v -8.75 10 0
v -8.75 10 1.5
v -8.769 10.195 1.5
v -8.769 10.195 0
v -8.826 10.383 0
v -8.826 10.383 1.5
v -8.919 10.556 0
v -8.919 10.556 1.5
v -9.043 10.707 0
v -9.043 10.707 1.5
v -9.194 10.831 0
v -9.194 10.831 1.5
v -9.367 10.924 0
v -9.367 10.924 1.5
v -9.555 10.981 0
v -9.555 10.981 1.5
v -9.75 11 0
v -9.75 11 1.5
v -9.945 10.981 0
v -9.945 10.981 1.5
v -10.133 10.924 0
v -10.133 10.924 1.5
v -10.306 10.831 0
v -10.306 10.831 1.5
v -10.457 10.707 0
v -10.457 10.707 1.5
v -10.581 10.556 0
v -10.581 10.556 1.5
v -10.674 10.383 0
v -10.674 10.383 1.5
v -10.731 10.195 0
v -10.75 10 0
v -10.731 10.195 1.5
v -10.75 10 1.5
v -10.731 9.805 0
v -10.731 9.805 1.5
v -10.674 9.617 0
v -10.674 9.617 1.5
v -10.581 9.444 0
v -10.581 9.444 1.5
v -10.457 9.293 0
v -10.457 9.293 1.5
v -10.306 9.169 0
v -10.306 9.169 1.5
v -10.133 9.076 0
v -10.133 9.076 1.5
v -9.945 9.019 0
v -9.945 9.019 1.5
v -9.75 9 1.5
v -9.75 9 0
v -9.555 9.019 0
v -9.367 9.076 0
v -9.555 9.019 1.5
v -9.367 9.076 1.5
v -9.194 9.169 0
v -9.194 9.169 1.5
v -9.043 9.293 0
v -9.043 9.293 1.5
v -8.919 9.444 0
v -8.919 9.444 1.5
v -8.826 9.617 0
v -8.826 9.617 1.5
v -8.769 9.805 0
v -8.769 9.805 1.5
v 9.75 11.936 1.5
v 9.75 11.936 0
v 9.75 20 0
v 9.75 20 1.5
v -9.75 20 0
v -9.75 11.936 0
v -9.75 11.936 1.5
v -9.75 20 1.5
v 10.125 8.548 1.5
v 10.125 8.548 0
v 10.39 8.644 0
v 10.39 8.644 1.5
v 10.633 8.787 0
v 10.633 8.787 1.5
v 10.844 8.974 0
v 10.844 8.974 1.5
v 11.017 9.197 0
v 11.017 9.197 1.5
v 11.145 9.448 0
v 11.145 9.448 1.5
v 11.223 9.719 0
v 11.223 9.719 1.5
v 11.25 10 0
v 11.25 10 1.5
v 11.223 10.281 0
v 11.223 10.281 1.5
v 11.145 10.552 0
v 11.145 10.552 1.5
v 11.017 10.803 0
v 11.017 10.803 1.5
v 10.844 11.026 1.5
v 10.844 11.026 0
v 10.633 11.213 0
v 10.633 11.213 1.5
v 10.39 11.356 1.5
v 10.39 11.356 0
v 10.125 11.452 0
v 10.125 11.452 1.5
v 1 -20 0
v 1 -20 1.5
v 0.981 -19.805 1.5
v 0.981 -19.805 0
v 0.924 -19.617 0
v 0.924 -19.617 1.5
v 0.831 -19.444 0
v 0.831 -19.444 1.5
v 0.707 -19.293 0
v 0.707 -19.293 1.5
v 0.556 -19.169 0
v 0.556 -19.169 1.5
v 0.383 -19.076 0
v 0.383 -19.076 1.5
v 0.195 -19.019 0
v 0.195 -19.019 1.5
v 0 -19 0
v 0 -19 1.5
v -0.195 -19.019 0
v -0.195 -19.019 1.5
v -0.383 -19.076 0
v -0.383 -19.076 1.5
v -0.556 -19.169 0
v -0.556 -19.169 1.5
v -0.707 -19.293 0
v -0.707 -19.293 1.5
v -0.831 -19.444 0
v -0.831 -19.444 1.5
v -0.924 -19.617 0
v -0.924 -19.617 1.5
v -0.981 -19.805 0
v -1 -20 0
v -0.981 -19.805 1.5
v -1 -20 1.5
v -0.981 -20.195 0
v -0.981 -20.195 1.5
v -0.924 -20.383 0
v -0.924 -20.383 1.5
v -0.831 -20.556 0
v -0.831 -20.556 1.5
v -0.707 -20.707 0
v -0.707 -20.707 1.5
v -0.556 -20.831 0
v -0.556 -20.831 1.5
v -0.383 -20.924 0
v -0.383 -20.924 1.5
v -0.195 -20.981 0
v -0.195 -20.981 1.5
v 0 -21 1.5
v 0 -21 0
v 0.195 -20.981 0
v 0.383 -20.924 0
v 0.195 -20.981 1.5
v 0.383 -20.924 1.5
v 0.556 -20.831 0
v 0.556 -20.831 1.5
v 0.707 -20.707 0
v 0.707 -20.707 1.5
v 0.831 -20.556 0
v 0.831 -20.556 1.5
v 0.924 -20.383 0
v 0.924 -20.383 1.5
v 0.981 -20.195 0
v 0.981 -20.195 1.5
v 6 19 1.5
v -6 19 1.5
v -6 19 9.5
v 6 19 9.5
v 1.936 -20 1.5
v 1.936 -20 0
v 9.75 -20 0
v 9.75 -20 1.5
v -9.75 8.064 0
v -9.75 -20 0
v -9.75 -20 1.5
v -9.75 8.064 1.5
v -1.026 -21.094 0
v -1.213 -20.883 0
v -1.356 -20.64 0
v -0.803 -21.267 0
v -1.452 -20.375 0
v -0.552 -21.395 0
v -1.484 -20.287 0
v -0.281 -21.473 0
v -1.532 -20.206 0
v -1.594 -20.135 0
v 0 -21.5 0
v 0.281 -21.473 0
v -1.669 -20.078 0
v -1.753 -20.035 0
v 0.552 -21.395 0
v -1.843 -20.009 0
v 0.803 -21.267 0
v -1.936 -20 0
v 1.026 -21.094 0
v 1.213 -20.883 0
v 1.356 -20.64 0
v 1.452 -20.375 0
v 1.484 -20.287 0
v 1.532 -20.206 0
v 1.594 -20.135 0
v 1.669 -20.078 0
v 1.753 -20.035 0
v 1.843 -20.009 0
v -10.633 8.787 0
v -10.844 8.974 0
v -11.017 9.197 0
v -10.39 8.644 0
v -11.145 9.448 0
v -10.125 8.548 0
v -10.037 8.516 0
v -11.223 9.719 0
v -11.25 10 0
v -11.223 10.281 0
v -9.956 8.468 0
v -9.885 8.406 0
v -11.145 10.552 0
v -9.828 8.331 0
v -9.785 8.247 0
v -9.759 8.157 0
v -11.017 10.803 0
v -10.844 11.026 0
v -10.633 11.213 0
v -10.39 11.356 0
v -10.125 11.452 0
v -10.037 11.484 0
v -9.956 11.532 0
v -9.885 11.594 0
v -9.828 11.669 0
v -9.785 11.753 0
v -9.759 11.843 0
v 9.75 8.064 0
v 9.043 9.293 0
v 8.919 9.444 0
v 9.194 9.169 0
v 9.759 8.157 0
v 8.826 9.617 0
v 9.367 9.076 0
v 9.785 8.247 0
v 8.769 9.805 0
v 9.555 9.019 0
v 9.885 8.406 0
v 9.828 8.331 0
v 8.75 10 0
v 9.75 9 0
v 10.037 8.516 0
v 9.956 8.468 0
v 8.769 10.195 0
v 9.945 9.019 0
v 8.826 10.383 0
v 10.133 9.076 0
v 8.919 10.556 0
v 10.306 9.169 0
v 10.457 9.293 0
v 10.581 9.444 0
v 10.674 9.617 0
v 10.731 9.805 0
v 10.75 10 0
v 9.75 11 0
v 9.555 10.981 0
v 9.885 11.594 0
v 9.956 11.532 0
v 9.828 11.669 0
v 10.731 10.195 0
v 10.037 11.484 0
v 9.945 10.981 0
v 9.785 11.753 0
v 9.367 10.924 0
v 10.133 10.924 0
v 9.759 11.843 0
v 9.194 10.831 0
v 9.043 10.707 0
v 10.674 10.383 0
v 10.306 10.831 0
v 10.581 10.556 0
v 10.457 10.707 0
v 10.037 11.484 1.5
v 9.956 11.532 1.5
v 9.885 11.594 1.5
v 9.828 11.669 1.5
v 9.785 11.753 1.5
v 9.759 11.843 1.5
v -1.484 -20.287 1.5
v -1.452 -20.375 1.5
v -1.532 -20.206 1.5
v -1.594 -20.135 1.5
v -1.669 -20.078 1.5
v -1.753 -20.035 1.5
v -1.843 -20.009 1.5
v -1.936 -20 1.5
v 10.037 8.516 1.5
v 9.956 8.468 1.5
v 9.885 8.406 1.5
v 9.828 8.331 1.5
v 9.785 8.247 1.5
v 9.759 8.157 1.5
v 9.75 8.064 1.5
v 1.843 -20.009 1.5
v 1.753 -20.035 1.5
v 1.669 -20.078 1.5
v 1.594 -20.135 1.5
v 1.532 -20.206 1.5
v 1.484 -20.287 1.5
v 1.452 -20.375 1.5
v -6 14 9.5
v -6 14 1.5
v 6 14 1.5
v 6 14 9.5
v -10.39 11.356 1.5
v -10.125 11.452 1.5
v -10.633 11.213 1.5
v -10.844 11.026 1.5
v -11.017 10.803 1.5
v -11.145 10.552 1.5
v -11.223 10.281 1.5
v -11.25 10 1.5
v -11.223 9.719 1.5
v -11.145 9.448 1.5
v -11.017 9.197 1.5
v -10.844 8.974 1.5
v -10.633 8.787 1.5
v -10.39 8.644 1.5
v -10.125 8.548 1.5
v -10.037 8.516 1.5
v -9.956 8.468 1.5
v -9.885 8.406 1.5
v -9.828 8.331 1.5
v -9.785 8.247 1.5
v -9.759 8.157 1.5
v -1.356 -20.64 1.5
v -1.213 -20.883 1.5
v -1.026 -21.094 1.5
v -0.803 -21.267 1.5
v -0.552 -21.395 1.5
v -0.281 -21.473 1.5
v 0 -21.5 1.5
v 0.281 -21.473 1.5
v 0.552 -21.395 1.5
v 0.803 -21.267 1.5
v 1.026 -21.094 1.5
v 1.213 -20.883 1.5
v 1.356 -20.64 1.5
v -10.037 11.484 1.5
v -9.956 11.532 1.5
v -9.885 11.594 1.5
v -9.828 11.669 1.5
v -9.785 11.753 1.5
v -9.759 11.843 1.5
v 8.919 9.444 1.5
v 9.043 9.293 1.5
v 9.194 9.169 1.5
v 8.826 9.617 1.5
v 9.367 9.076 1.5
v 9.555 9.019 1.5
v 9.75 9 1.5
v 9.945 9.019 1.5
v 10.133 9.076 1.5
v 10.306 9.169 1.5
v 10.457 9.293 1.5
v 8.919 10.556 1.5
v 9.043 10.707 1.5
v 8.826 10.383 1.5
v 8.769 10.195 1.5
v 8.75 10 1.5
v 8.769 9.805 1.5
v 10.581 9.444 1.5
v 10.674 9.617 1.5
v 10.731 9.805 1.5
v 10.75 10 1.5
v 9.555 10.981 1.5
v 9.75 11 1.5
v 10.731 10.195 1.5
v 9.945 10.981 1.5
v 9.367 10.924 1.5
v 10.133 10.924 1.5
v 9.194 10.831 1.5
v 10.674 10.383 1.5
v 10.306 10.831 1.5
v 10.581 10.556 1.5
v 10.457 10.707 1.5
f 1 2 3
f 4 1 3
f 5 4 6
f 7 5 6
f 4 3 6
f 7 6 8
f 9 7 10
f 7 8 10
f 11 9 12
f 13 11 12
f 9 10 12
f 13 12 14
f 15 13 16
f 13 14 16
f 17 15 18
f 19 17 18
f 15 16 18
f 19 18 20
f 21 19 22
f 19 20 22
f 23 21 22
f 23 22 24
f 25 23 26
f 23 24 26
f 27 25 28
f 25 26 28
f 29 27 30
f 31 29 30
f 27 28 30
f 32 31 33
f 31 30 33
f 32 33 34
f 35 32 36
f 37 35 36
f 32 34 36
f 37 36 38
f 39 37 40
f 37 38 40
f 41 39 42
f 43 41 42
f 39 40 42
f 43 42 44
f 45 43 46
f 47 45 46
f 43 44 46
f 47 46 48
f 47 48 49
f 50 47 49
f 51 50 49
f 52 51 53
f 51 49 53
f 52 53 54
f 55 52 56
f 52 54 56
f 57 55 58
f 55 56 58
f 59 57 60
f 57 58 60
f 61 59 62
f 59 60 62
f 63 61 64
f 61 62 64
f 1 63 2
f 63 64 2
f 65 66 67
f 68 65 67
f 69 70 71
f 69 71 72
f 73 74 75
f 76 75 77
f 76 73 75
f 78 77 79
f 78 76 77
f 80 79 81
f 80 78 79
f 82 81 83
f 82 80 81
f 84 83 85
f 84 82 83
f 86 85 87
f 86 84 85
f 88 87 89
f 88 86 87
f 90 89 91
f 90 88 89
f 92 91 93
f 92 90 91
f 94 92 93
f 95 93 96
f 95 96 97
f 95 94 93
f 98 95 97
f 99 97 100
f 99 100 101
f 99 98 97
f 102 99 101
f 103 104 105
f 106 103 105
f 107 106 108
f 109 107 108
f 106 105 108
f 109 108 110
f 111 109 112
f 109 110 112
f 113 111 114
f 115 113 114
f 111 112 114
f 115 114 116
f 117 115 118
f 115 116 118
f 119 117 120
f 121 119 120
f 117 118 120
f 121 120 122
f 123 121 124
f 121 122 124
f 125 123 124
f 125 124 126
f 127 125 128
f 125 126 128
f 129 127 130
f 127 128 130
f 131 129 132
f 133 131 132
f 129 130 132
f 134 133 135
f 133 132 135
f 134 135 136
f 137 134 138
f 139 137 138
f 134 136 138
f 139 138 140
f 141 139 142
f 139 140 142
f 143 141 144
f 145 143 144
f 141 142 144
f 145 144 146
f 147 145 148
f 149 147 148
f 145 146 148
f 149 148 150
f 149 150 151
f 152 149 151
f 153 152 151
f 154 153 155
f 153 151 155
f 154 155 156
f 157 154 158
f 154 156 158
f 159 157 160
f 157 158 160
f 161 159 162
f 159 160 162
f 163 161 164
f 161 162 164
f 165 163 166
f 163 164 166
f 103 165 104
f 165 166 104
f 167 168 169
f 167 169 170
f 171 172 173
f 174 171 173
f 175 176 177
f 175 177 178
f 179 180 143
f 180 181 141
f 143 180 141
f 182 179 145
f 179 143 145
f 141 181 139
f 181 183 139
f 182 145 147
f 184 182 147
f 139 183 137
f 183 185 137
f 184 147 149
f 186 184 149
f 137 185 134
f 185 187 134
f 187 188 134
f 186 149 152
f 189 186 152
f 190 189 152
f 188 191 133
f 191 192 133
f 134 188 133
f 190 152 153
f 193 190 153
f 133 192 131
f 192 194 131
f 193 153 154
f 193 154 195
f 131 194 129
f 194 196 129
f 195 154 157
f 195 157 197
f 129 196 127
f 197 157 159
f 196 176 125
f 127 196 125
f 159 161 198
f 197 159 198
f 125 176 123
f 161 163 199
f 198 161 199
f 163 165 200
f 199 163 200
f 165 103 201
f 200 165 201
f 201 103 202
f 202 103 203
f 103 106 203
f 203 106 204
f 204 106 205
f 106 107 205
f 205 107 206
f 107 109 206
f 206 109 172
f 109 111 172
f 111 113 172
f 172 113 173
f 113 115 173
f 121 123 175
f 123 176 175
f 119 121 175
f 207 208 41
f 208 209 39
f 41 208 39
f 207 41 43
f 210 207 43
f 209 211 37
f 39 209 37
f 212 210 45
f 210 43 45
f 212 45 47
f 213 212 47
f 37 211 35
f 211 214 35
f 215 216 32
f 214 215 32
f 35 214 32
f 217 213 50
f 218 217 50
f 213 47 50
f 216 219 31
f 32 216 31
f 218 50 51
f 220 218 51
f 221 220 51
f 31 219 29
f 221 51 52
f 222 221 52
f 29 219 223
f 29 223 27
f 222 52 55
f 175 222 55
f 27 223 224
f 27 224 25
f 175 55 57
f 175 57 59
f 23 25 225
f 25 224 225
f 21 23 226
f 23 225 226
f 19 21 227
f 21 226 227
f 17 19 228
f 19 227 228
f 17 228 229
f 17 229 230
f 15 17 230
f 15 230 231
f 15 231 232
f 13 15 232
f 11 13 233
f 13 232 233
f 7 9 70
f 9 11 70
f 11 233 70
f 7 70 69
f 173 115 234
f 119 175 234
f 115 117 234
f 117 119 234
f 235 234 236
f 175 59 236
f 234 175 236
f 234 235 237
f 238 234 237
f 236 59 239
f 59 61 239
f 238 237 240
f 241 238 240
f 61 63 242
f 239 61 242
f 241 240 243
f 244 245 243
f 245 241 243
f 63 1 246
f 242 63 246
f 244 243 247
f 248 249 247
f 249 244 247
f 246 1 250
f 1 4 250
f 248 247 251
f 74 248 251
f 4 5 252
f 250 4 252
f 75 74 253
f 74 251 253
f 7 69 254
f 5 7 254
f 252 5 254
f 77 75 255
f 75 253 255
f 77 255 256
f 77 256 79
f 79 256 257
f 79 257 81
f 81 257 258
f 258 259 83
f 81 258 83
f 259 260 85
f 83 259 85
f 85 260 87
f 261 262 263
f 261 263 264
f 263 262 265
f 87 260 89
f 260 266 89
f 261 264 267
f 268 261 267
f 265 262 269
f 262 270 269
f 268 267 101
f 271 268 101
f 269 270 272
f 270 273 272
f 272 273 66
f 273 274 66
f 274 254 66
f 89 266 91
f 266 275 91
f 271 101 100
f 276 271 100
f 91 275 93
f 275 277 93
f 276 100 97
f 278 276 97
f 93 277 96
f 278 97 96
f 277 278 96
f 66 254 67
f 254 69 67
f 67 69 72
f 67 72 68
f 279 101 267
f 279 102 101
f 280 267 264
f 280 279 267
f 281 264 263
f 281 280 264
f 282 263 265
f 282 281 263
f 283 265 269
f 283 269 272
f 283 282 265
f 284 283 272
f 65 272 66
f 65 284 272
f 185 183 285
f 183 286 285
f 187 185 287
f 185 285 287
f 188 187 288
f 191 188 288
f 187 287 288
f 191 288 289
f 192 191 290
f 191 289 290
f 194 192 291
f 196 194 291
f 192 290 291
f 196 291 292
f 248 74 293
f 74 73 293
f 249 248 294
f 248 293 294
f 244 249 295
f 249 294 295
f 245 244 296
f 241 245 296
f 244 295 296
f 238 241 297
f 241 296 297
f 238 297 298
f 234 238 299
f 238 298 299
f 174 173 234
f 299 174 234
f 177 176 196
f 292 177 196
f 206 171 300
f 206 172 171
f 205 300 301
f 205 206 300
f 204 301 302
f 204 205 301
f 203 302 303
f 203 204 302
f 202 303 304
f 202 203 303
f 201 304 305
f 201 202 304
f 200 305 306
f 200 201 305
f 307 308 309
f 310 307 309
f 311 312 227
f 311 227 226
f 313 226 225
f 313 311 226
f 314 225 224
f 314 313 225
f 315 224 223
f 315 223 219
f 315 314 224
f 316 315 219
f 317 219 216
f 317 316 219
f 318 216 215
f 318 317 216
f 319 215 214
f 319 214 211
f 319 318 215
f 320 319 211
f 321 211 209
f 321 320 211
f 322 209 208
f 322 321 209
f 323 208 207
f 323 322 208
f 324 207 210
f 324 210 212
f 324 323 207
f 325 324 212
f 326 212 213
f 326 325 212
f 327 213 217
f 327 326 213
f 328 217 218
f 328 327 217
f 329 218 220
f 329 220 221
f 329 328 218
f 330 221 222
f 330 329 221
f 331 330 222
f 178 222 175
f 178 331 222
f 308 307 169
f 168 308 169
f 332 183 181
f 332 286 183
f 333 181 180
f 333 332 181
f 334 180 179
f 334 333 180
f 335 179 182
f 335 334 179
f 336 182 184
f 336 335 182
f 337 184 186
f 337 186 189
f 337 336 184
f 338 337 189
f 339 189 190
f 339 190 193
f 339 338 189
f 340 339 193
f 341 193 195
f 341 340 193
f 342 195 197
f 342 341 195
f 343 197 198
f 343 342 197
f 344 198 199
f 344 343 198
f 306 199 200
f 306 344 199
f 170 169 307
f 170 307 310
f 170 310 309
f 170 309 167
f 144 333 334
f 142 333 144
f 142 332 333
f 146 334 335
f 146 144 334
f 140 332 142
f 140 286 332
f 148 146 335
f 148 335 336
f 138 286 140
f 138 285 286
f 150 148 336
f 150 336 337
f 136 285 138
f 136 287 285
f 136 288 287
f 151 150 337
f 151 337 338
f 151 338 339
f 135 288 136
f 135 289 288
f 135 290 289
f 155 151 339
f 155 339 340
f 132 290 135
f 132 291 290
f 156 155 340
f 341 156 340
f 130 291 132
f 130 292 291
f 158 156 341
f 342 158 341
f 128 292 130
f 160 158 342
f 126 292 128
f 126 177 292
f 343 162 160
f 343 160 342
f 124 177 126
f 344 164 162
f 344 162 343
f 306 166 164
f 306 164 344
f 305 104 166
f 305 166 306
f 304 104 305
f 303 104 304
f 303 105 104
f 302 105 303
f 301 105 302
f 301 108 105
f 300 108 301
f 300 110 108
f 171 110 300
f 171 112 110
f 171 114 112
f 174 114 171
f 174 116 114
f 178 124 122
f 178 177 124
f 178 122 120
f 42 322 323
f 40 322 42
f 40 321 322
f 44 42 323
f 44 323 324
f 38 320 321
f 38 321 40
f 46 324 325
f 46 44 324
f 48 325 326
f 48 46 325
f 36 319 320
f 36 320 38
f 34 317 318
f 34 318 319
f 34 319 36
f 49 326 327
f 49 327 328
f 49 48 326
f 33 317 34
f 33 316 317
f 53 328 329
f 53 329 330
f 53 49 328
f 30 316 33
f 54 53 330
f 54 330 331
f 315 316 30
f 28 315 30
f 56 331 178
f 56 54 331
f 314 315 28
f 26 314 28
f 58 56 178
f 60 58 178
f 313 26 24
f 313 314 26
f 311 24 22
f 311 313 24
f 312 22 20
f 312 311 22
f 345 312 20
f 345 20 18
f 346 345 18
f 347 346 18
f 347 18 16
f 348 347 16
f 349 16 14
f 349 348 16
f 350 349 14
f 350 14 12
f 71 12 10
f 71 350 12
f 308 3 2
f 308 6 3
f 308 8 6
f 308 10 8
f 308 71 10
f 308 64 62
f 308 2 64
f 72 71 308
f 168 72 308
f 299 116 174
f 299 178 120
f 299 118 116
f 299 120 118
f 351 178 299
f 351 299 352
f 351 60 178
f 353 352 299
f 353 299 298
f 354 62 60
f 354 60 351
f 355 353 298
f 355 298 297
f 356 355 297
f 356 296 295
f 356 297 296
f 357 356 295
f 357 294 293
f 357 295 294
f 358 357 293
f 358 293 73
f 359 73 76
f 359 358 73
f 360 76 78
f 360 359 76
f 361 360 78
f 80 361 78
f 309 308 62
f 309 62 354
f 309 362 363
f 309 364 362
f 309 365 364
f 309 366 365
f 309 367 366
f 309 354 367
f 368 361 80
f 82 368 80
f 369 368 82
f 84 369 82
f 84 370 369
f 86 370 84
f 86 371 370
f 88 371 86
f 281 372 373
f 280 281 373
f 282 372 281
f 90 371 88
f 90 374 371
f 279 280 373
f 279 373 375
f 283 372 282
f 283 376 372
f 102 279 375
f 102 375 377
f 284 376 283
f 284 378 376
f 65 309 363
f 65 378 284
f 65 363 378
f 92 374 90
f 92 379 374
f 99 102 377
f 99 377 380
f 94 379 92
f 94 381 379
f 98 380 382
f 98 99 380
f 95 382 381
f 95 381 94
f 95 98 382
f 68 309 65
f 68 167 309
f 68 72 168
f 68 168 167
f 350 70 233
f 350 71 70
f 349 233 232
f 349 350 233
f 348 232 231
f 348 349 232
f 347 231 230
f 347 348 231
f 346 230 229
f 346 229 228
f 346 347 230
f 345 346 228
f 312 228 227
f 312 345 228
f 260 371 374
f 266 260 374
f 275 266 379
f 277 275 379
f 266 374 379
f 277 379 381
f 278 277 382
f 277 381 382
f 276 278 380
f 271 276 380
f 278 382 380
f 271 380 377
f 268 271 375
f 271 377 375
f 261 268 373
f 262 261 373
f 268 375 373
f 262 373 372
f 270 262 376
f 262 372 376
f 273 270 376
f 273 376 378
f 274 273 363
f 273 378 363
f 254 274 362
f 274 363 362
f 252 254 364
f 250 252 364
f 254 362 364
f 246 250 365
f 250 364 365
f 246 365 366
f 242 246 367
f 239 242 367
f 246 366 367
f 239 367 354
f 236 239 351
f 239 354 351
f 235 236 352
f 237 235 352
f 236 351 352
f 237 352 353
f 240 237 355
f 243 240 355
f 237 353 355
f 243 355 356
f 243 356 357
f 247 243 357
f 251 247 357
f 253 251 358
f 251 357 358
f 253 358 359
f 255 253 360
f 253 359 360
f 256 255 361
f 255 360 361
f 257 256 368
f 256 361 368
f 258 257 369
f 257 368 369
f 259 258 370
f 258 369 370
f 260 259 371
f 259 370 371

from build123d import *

# Parameters (mm, degrees)
SKETCH_1_W          = 19.5
SKETCH_1_H          = 40
EXTRUDE_1_DEPTH     = 1.5
SKETCH_2_R          = 1.5
EXTRUDE_2_DEPTH     = 1.5
SKETCH_3_R          = 1
CUT_EXTRUDE_1_DEPTH = 1.5
FILLET_1_R          = 0.5
SKETCH_4_W          = 12
SKETCH_4_H          = 5
EXTRUDE_3_DEPTH     = 8


with BuildPart() as part:
    # ｽｹｯﾁ1 → ﾎﾞｽ - 押し出し1 (new body)
    with BuildSketch(Plane.XY):
        Rectangle(SKETCH_1_W, SKETCH_1_H)
    extrude(amount=EXTRUDE_1_DEPTH)

    # ｽｹｯﾁ2 → ﾎﾞｽ - 押し出し2 (add)
    with BuildSketch(Plane.XY.offset(1.5)):
        with Locations((9.75, 10)):
            Circle(SKETCH_2_R)
        with Locations((-9.75, 10)):
            Circle(SKETCH_2_R)
        with Locations((0, -20)):
            Circle(SKETCH_2_R)
    extrude(amount=-EXTRUDE_2_DEPTH)

    # ｽｹｯﾁ3 → ｶｯﾄ - 押し出し1 (cut)
    with BuildSketch(Plane.XY.offset(1.5)):
        with Locations((-9.75, 10)):
            Circle(SKETCH_3_R)
        with Locations((9.75, 10)):
            Circle(SKETCH_3_R)
        with Locations((0, -20)):
            Circle(SKETCH_3_R)
    extrude(amount=-CUT_EXTRUDE_1_DEPTH, mode=Mode.SUBTRACT)

    # ﾌｨﾚｯﾄ1
    fillet_1_edges = [part.edges().sort_by_distance(p)[0] for p in [
        (9.75, 8.5, 0.75),
        (9.75, 11.5, 0.75),
        (-9.75, 11.5, 0.75),
        (-9.75, 8.5, 0.75),
        (-1.5, -20, 0.75),
        (1.5, -20, 0.75),
    ]]
    fillet(fillet_1_edges, radius=FILLET_1_R)

    # ｽｹｯﾁ4 → ﾎﾞｽ - 押し出し3 (add)
    with BuildSketch(Plane.XY.offset(1.5)):
        with Locations((0, 16.5)):
            Rectangle(SKETCH_4_W, SKETCH_4_H)
    extrude(amount=EXTRUDE_3_DEPTH)


solid = part.part
